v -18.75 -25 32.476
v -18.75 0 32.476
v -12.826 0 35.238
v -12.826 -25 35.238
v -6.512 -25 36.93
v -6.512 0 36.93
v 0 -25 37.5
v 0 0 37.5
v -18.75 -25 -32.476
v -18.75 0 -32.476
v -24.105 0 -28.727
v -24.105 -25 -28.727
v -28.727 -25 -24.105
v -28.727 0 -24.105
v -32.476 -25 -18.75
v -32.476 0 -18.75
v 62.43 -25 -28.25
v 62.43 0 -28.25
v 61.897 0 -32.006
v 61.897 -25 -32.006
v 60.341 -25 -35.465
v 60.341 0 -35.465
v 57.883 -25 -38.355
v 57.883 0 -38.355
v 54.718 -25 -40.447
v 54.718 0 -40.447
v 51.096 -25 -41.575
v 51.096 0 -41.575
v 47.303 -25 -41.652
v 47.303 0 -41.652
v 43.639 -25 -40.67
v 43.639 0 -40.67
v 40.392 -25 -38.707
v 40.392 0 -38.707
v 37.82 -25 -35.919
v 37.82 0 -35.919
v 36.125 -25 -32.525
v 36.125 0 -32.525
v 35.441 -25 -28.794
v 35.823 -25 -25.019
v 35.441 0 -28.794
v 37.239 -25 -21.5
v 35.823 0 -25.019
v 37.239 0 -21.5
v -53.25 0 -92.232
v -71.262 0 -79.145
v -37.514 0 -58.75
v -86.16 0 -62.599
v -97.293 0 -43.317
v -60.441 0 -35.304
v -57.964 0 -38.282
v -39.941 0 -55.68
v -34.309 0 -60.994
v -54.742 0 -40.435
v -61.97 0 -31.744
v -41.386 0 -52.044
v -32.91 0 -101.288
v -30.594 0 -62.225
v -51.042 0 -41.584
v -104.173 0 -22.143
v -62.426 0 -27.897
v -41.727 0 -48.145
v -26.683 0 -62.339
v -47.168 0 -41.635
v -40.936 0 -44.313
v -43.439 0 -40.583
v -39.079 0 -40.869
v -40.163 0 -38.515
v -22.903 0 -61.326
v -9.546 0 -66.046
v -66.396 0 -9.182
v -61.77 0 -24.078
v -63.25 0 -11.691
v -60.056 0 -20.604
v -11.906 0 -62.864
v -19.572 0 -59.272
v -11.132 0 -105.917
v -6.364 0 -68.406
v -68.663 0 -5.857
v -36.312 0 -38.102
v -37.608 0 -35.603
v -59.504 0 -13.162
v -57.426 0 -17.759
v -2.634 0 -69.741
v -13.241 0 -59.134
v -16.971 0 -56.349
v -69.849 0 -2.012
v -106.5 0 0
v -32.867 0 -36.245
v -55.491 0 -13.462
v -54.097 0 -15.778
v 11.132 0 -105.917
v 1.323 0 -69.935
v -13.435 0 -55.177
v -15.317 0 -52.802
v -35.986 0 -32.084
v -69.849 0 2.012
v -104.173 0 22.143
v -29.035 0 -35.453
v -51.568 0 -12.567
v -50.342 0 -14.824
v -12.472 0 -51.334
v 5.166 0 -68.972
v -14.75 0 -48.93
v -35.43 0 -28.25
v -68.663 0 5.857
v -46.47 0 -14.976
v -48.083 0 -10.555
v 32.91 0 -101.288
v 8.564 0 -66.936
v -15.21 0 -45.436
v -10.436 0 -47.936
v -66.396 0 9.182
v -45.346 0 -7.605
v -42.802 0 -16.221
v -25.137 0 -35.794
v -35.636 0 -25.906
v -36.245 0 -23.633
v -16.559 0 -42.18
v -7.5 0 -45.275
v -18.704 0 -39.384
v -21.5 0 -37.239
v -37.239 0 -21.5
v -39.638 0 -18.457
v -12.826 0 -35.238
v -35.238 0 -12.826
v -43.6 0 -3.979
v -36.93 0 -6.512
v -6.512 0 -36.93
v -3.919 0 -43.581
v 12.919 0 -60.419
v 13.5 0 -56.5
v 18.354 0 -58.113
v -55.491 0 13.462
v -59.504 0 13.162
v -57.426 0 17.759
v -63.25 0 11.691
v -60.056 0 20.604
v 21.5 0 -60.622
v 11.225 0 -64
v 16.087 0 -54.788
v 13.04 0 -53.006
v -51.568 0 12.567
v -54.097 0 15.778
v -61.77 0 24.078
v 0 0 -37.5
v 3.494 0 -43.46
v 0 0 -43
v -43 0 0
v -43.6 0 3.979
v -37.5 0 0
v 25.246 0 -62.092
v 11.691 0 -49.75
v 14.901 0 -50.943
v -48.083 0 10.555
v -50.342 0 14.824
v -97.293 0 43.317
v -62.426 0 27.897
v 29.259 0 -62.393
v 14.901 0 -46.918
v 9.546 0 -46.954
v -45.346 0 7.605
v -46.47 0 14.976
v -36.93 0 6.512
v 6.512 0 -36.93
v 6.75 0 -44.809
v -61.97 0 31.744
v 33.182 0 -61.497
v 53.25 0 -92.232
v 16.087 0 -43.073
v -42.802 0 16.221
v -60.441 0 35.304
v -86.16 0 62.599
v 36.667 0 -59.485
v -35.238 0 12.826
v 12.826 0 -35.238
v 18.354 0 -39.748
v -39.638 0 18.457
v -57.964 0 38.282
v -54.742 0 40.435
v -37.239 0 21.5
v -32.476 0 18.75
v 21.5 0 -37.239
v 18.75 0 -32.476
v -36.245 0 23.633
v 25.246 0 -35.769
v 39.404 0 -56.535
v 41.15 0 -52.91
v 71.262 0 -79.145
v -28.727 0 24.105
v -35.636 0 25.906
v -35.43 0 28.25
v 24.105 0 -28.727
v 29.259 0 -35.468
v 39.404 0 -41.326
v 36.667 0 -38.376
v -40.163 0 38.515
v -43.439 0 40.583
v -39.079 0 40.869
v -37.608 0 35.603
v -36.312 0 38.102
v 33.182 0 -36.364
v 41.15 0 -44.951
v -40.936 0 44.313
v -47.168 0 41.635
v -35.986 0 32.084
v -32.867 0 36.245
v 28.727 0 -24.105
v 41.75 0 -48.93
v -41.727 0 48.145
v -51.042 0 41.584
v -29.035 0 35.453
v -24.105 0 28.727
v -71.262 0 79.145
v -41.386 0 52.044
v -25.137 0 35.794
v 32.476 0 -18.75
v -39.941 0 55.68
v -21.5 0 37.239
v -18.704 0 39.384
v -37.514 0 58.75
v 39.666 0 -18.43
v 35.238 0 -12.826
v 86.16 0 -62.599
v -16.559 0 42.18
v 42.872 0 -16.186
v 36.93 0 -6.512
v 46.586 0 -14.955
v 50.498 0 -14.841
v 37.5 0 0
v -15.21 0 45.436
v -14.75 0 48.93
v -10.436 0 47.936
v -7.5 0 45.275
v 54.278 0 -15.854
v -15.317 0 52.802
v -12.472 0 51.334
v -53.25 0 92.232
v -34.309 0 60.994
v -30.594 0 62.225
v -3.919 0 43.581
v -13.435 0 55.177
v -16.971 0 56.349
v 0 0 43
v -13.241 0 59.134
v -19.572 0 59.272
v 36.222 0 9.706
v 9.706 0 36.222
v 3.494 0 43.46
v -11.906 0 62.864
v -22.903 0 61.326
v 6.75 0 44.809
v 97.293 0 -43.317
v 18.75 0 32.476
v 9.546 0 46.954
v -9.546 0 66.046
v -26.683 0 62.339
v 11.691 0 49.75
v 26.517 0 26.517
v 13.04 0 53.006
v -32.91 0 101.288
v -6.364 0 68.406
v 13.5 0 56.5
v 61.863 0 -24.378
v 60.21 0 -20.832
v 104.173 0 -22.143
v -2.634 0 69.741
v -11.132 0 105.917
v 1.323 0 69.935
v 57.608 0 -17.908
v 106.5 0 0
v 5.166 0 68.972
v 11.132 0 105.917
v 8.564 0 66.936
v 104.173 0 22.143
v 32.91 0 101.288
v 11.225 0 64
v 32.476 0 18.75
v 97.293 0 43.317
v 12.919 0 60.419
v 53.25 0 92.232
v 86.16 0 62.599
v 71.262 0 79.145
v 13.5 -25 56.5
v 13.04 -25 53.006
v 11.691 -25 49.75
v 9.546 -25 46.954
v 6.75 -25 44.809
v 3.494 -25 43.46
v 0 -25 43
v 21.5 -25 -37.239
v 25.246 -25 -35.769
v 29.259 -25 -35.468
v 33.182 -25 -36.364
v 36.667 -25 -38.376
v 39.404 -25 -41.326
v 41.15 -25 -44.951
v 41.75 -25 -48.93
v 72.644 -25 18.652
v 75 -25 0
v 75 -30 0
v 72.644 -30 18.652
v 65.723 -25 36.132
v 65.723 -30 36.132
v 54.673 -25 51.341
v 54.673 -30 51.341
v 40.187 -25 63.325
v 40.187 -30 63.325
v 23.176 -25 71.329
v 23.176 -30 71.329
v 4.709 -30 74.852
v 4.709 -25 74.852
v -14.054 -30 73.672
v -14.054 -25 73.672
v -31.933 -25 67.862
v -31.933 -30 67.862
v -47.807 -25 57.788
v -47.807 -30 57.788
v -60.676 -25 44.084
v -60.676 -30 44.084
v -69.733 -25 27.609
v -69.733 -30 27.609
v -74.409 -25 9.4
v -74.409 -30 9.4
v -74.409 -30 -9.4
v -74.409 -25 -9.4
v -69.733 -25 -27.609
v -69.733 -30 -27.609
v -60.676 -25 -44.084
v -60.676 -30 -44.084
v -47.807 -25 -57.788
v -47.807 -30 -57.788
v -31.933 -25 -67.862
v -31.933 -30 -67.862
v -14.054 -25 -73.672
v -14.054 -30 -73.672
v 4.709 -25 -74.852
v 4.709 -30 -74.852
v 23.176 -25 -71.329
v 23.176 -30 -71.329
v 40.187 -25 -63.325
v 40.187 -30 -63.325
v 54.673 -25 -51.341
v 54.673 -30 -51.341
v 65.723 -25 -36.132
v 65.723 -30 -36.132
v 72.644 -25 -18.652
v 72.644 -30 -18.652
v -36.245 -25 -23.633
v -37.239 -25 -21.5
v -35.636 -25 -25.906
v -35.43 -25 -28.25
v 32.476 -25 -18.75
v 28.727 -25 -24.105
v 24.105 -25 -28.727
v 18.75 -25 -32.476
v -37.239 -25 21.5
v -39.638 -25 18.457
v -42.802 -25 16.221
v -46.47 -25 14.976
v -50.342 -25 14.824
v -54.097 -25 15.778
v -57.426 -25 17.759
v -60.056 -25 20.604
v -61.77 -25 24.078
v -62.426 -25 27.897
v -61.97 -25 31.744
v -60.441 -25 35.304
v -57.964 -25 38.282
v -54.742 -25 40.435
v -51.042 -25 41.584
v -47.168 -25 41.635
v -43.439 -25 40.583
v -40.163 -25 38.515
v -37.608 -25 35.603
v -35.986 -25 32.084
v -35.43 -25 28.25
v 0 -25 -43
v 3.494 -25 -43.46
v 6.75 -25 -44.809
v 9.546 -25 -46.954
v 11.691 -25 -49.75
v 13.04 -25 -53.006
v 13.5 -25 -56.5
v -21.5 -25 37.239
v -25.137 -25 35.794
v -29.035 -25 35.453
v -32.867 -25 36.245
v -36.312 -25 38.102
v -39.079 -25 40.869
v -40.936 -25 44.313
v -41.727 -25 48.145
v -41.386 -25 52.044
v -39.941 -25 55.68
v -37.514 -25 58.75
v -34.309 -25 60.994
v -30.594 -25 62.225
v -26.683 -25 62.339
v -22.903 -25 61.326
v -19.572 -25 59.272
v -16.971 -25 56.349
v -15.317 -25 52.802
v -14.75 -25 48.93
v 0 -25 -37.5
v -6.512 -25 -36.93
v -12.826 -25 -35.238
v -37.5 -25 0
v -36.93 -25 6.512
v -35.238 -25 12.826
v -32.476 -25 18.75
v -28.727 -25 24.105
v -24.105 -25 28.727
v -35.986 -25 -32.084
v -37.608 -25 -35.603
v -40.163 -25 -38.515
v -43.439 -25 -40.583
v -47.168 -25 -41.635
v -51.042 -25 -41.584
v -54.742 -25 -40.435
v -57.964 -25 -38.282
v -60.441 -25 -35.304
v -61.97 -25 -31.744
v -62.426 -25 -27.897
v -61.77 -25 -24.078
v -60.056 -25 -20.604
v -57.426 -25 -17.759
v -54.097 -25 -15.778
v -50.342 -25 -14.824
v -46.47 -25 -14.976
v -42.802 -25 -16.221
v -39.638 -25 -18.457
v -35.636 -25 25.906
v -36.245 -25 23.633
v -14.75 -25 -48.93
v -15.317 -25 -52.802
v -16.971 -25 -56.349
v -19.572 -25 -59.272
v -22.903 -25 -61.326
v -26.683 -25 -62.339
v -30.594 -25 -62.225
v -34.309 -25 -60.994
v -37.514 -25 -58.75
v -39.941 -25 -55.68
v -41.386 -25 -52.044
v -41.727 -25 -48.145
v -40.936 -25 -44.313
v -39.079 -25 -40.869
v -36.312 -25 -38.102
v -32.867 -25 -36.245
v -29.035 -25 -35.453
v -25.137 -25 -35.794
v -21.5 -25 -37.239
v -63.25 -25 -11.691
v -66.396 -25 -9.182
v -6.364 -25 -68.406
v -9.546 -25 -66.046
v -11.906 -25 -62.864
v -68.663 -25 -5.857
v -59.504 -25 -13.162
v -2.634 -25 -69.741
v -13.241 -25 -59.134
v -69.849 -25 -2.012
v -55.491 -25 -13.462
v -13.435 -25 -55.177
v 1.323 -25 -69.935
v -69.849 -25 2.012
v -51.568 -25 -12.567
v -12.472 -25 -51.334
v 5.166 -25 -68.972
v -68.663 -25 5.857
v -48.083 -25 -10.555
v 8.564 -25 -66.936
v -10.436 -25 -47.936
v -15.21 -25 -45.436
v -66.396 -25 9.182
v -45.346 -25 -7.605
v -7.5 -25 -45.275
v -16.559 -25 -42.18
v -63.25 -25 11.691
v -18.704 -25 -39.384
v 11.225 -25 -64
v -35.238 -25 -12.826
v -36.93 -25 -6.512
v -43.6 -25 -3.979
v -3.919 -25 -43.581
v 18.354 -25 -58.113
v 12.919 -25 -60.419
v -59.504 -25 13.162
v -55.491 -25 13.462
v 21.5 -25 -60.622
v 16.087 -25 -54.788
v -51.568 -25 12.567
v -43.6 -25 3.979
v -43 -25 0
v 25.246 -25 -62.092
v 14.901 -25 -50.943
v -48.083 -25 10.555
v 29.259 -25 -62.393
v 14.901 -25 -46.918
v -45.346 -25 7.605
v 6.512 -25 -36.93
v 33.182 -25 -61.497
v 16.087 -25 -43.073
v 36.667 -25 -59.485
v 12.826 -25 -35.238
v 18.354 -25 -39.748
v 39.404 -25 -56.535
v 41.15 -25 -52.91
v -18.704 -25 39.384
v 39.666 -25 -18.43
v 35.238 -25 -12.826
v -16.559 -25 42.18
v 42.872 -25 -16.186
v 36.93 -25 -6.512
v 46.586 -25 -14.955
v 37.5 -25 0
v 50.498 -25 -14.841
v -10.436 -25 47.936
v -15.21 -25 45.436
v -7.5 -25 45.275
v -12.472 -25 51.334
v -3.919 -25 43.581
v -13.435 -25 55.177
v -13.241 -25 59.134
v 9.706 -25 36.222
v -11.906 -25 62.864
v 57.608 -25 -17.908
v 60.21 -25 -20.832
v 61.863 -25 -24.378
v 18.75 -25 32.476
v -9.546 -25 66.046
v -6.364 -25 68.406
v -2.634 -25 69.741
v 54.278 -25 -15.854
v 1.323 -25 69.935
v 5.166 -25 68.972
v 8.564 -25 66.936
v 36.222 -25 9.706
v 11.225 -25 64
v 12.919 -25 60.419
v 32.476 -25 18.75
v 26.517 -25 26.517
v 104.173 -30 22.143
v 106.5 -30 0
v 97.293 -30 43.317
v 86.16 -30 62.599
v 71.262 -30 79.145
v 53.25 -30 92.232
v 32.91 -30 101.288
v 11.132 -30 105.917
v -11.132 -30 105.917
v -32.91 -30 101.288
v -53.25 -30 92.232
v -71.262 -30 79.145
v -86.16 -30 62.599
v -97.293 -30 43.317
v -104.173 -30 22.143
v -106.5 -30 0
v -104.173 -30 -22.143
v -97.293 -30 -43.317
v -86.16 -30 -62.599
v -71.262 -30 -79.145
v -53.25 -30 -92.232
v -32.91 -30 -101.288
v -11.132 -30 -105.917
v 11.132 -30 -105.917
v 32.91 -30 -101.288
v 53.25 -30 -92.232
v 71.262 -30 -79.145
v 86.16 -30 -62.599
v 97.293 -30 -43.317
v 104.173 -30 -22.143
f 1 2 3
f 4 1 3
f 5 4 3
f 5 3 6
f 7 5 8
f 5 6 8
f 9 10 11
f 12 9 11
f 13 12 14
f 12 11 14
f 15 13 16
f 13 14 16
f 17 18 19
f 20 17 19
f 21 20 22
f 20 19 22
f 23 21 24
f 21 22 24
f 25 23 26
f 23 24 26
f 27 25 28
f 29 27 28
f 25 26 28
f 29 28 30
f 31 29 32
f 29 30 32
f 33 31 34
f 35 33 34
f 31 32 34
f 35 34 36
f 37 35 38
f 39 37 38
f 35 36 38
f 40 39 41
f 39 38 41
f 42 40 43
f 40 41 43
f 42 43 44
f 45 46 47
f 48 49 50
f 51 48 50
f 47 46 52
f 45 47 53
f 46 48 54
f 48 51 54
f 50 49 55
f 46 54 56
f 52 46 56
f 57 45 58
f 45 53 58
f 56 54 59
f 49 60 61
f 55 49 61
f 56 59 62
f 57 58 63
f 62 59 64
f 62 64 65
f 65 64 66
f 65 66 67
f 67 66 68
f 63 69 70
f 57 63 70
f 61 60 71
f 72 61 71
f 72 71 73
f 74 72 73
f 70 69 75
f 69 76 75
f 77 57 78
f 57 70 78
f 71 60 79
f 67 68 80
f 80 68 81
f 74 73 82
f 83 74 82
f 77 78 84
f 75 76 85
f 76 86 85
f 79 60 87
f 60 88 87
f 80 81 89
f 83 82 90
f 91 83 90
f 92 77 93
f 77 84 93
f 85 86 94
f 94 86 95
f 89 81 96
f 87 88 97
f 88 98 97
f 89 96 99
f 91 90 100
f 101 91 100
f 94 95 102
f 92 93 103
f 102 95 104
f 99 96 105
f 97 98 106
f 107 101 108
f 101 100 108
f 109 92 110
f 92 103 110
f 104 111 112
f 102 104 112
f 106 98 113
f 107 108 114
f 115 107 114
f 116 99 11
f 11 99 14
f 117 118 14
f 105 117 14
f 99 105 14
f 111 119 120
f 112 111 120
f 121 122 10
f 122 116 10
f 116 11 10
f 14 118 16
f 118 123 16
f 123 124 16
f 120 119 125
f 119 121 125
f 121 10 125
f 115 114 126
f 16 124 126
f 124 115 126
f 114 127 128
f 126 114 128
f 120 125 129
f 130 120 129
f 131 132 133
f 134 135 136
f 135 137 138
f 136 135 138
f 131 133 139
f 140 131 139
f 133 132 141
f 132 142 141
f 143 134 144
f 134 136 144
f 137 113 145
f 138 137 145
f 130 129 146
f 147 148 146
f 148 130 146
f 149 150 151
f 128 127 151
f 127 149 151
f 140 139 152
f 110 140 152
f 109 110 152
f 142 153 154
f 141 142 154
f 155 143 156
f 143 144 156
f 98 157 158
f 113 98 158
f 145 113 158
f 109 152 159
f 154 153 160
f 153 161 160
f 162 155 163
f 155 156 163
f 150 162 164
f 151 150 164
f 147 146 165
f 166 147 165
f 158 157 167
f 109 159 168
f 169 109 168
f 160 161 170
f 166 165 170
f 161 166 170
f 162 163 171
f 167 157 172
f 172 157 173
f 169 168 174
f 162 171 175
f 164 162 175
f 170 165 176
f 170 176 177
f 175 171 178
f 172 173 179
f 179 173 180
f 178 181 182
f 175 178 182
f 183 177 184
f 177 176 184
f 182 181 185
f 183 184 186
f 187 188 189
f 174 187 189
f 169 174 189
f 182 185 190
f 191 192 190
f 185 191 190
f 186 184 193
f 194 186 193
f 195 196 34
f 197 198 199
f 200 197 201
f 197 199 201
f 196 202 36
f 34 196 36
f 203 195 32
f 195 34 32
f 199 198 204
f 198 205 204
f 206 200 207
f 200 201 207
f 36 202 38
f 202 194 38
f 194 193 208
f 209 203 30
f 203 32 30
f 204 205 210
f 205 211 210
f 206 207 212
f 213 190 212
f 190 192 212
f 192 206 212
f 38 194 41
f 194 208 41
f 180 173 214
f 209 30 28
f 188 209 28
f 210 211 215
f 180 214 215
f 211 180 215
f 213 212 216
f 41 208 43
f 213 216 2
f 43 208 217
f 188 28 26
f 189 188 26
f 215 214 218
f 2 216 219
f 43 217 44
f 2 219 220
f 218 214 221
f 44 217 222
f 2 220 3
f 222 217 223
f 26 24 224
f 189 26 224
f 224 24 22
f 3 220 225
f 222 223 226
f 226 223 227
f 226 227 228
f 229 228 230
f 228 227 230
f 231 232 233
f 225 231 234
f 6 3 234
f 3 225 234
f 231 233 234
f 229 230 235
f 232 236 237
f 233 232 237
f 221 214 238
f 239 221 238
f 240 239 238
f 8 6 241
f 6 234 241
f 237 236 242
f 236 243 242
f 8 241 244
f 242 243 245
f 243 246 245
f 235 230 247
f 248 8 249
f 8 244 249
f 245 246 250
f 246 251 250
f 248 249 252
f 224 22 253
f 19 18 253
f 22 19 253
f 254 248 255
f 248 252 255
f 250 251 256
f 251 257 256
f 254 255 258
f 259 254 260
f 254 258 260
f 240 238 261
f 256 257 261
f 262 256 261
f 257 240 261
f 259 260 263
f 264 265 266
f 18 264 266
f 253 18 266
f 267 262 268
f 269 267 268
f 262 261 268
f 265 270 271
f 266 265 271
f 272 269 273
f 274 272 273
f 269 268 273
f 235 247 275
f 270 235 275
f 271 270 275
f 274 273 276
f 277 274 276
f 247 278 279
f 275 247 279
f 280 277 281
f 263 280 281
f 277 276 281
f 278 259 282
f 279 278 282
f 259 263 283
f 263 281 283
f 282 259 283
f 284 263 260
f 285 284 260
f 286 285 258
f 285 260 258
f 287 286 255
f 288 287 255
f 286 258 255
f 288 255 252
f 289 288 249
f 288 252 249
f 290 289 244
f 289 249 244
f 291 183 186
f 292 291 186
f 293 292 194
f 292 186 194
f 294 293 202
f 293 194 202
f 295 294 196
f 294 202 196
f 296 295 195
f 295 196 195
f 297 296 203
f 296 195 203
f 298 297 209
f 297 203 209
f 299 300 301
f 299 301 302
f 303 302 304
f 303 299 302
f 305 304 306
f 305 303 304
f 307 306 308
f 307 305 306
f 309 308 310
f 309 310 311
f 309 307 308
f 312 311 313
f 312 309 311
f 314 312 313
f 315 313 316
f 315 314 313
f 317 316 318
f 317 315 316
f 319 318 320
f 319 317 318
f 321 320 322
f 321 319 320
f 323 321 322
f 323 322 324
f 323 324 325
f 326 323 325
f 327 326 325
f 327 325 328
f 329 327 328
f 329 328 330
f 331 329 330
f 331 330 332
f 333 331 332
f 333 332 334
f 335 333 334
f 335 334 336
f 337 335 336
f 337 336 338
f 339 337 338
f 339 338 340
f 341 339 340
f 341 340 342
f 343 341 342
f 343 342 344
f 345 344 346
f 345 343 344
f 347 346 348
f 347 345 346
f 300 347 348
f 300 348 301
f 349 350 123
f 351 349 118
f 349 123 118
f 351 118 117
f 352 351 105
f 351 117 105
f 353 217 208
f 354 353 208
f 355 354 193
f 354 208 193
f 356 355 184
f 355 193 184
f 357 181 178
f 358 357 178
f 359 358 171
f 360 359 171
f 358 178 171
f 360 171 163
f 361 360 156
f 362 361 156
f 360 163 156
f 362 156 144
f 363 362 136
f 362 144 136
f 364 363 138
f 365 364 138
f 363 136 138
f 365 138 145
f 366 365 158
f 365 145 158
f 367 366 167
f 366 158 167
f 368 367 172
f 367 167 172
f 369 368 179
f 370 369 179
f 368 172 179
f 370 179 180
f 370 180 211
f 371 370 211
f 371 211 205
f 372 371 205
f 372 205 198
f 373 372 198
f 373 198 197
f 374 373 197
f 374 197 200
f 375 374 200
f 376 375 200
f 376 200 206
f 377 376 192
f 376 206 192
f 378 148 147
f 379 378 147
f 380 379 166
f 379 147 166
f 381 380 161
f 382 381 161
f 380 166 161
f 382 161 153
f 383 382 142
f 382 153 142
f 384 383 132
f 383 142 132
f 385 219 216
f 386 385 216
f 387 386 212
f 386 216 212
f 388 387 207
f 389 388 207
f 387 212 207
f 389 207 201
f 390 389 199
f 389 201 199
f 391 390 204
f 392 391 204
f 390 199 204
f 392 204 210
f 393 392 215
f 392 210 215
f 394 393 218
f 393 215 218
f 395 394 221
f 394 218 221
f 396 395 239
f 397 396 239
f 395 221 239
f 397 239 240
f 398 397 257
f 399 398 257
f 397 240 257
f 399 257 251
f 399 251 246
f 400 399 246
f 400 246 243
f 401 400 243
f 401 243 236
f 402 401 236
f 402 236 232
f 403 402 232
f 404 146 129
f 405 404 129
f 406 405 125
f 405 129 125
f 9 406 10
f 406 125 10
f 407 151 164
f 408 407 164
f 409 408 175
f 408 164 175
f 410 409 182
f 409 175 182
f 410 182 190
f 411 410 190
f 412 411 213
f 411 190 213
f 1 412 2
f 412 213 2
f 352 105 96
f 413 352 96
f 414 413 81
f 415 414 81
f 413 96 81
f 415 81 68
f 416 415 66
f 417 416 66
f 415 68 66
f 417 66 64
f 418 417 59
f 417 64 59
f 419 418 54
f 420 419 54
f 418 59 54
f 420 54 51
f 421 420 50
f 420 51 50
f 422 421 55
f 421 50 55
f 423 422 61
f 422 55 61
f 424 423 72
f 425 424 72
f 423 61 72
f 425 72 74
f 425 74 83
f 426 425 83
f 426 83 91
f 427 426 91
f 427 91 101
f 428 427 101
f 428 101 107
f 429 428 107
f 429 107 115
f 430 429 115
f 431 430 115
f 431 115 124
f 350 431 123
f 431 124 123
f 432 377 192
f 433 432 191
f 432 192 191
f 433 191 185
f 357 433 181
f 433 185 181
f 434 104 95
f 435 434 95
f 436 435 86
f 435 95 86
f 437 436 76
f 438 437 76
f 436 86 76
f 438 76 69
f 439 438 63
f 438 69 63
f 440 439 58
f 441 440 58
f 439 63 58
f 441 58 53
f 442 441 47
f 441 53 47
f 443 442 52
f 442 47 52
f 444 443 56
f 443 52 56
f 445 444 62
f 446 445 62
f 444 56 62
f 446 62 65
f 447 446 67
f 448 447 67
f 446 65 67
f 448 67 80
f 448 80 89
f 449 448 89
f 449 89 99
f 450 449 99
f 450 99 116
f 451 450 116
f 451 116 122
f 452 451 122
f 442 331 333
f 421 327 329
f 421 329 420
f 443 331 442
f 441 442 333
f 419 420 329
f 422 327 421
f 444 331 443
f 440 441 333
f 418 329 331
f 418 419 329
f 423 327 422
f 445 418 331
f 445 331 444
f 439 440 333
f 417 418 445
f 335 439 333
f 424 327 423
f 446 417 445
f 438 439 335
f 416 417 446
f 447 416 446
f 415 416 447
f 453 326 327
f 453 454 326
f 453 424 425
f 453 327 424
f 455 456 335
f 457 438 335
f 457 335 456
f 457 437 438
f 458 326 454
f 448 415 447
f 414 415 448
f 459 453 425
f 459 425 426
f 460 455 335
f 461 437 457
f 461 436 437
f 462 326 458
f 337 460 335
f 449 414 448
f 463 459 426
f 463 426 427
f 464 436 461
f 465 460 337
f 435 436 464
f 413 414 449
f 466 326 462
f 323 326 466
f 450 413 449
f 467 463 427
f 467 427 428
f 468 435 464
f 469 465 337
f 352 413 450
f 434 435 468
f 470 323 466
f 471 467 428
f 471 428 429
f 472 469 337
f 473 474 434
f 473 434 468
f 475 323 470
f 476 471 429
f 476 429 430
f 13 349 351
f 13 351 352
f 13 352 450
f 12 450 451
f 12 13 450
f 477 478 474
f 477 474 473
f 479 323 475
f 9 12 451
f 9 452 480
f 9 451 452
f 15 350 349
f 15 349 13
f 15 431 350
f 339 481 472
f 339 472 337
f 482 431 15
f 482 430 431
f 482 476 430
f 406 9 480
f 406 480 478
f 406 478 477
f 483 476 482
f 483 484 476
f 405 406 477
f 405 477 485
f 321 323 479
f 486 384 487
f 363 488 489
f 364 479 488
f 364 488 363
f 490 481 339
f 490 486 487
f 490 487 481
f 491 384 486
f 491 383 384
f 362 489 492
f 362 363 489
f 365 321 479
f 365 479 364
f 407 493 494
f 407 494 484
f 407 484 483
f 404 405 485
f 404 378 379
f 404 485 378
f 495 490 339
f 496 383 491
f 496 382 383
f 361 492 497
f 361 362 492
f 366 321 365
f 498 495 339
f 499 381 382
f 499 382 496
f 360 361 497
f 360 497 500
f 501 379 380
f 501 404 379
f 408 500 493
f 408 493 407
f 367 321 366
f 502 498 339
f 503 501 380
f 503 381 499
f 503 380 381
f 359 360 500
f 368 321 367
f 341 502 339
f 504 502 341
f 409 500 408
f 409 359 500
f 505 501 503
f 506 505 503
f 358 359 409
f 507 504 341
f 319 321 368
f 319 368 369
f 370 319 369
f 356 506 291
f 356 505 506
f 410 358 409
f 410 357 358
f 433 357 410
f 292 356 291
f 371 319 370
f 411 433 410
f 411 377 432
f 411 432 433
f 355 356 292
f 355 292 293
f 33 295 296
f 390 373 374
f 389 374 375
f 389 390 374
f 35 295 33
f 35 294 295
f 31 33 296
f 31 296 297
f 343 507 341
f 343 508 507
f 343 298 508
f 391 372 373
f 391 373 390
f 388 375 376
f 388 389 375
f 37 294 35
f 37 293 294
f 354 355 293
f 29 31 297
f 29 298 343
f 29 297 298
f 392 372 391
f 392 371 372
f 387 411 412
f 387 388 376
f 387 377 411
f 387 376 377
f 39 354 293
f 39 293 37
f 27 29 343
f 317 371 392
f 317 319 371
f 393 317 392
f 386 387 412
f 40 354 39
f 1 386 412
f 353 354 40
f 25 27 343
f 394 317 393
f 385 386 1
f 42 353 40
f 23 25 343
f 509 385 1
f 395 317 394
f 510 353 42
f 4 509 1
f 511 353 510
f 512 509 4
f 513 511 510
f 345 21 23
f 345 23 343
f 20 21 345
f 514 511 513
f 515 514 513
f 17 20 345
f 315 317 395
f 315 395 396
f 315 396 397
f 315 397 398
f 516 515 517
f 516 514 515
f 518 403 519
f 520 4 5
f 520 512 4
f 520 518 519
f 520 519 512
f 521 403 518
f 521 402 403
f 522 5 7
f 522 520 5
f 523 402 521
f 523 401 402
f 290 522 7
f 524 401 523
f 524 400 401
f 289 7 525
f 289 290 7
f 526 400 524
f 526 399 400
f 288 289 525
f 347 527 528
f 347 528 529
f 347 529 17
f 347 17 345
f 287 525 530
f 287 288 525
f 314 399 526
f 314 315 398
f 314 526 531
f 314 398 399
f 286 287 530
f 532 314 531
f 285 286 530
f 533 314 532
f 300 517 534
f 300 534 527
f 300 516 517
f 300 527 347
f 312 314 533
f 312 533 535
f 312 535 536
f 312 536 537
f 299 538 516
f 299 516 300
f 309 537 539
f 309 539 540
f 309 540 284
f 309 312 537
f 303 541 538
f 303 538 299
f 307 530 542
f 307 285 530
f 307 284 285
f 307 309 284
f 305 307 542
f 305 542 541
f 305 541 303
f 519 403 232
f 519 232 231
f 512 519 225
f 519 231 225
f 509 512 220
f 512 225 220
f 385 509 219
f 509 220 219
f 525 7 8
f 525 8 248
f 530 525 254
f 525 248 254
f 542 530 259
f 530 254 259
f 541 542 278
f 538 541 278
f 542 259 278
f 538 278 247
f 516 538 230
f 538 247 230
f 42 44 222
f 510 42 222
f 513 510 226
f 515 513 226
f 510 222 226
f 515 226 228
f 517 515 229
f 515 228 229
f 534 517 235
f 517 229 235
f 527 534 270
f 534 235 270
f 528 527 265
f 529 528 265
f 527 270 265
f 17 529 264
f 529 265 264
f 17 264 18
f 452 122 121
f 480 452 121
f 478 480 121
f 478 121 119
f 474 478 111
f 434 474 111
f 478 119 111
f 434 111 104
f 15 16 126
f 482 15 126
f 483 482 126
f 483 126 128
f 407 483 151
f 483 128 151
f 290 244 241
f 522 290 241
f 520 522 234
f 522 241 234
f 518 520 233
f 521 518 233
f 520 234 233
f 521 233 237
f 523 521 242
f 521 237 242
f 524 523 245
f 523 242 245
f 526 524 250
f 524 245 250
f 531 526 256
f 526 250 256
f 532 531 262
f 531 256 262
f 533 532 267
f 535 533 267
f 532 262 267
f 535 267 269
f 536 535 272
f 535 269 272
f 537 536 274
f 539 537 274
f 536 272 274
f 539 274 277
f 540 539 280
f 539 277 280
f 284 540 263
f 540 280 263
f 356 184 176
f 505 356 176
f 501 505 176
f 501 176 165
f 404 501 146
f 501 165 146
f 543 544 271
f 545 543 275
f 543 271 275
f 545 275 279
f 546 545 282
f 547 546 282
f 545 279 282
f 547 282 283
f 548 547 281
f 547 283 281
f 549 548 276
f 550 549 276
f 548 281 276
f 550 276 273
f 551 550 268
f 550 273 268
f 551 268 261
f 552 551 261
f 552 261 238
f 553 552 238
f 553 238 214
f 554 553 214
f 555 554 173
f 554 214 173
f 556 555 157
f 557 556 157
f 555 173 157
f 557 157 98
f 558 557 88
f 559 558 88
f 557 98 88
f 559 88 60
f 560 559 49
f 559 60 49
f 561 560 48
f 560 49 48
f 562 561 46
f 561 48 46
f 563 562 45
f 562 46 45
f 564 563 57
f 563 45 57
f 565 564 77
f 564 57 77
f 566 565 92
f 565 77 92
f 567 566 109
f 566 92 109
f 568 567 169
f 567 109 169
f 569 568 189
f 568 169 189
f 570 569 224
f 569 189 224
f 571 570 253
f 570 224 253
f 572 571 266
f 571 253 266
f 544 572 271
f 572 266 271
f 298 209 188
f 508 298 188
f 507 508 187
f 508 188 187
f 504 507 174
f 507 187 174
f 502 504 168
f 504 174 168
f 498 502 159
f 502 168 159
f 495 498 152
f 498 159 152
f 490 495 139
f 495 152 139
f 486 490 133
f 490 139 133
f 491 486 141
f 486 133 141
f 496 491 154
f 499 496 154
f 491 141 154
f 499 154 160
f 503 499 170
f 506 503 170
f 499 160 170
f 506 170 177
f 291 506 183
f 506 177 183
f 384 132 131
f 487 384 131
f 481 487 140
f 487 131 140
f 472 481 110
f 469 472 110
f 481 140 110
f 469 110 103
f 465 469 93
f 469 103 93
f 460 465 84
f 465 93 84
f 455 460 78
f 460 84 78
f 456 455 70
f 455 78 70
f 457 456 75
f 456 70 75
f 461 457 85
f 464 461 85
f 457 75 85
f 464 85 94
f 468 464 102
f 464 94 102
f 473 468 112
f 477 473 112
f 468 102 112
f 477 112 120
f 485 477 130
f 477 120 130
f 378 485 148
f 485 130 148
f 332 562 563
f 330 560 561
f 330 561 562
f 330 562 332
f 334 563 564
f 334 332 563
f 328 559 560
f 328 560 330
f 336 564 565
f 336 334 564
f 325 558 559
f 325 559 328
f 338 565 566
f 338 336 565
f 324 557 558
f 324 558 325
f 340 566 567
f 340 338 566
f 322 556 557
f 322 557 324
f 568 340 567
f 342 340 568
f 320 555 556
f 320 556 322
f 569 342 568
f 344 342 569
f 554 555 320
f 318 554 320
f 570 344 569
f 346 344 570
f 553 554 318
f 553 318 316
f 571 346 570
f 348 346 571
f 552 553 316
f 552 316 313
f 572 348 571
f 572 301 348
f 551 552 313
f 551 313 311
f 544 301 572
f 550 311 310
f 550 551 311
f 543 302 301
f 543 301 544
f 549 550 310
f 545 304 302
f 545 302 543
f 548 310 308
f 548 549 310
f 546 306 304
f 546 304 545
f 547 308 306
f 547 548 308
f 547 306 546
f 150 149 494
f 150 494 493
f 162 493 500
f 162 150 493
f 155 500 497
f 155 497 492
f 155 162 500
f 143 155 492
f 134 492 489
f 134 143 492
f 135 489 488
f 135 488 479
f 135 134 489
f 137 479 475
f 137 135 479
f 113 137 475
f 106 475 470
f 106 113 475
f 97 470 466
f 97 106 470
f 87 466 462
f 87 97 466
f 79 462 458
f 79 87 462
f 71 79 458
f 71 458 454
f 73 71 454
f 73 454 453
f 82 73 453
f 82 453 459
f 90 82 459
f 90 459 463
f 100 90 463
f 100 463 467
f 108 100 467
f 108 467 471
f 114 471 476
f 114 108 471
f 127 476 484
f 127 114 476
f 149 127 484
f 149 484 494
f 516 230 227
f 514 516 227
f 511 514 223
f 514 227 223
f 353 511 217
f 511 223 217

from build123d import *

# Parameters (mm, degrees)
F0_R     = 106.5
F0_R_2   = 75
F1_DEPTH = 30
F0_R_3   = 13.5
F2_DEPTH = 25


with BuildPart() as f1:
    # F0 (on Front) → F1 (new body)
    with BuildSketch(Plane.XZ):
        Circle(F0_R)
        Circle(F0_R_2, mode=Mode.SUBTRACT)
    extrude(amount=F1_DEPTH)

    # F0 (on Front) → F2 (join)
    with BuildSketch(Plane.XZ):
        Circle(F0_R_2)
        with BuildLine():
            ThreePointArc((-14.75, -48.930435), (-39.941343, -55.680435), (-21.5, -37.239092))
            ThreePointArc((-21.5, -37.239092), (-16.558657, -42.180435), (-14.75, -48.930435))
        make_face(mode=Mode.SUBTRACT)
        with BuildLine():
            ThreePointArc((-35.430435, -28.25), (-61.970434, -31.744057), (-37.239092, -21.5))
            ThreePointArc((-37.239092, -21.5), (-35.890437, -24.755943), (-35.430435, -28.25))
        make_face(mode=Mode.SUBTRACT)
        with BuildLine():
            ThreePointArc((13.5, -56.5), (-9.545942, -66.045942), (0, -43))
            ThreePointArc((0, -43), (9.545942, -46.954058), (13.5, -56.5))
        make_face(mode=Mode.SUBTRACT)
        with BuildLine():
            ThreePointArc((41.75, -48.930435), (21.5, -60.621778), (21.5, -37.239092))
            ThreePointArc((21.5, -37.239092), (35, -37.239092), (41.75, -48.930435))
        make_face(mode=Mode.SUBTRACT)
        with BuildLine():
            ThreePointArc((62.430435, -28.25), (45.436378, -41.289999), (37.239092, -21.5))
            ThreePointArc((37.239092, -21.5), (52.424492, -15.210001), (62.430435, -28.25))
        make_face(mode=Mode.SUBTRACT)
        with Locations((-56.5, 0)):
            Circle(F0_R_3, mode=Mode.SUBTRACT)
        with BuildLine():
            ThreePointArc((-35.430435, 28.25), (-35.890437, 24.755943), (-37.239092, 21.5))
            ThreePointArc((-37.239092, 21.5), (-61.970434, 31.744057), (-35.430435, 28.25))
        make_face(mode=Mode.SUBTRACT)
        with BuildLine():
            ThreePointArc((-14.75, 48.930435), (-16.558657, 42.180435), (-21.5, 37.239092))
            ThreePointArc((-21.5, 37.239092), (-39.941343, 55.680435), (-14.75, 48.930435))
        make_face(mode=Mode.SUBTRACT)
        with BuildLine():
            ThreePointArc((-18.75, 32.475953), (-9.705714, 36.222218), (0, 37.5))
            ThreePointArc((0, 37.5), (26.516504, 26.516504), (37.5, 0))
            ThreePointArc((37.5, 0), (36.222218, -9.705714), (32.475953, -18.75))
            ThreePointArc((32.475953, -18.75), (26.516504, -26.516504), (18.75, -32.475953))
            ThreePointArc((18.75, -32.475953), (9.705714, -36.222218), (0, -37.5))
            ThreePointArc((0, -37.5), (-9.705714, -36.222218), (-18.75, -32.475953))
            ThreePointArc((-18.75, -32.475953), (-26.516504, -26.516504), (-32.475953, -18.75))
            ThreePointArc((-32.475953, -18.75), (-36.222218, -9.705714), (-37.5, 0))
            ThreePointArc((-37.5, 0), (-36.222218, 9.705714), (-32.475953, 18.75))
            ThreePointArc((-32.475953, 18.75), (-26.516504, 26.516504), (-18.75, 32.475953))
        make_face(mode=Mode.SUBTRACT)
        with BuildLine():
            ThreePointArc((13.5, 56.5), (9.545942, 46.954058), (0, 43))
            ThreePointArc((0, 43), (-9.545942, 66.045942), (13.5, 56.5))
        make_face(mode=Mode.SUBTRACT)
    extrude(amount=F2_DEPTH)


solid = f1.part
